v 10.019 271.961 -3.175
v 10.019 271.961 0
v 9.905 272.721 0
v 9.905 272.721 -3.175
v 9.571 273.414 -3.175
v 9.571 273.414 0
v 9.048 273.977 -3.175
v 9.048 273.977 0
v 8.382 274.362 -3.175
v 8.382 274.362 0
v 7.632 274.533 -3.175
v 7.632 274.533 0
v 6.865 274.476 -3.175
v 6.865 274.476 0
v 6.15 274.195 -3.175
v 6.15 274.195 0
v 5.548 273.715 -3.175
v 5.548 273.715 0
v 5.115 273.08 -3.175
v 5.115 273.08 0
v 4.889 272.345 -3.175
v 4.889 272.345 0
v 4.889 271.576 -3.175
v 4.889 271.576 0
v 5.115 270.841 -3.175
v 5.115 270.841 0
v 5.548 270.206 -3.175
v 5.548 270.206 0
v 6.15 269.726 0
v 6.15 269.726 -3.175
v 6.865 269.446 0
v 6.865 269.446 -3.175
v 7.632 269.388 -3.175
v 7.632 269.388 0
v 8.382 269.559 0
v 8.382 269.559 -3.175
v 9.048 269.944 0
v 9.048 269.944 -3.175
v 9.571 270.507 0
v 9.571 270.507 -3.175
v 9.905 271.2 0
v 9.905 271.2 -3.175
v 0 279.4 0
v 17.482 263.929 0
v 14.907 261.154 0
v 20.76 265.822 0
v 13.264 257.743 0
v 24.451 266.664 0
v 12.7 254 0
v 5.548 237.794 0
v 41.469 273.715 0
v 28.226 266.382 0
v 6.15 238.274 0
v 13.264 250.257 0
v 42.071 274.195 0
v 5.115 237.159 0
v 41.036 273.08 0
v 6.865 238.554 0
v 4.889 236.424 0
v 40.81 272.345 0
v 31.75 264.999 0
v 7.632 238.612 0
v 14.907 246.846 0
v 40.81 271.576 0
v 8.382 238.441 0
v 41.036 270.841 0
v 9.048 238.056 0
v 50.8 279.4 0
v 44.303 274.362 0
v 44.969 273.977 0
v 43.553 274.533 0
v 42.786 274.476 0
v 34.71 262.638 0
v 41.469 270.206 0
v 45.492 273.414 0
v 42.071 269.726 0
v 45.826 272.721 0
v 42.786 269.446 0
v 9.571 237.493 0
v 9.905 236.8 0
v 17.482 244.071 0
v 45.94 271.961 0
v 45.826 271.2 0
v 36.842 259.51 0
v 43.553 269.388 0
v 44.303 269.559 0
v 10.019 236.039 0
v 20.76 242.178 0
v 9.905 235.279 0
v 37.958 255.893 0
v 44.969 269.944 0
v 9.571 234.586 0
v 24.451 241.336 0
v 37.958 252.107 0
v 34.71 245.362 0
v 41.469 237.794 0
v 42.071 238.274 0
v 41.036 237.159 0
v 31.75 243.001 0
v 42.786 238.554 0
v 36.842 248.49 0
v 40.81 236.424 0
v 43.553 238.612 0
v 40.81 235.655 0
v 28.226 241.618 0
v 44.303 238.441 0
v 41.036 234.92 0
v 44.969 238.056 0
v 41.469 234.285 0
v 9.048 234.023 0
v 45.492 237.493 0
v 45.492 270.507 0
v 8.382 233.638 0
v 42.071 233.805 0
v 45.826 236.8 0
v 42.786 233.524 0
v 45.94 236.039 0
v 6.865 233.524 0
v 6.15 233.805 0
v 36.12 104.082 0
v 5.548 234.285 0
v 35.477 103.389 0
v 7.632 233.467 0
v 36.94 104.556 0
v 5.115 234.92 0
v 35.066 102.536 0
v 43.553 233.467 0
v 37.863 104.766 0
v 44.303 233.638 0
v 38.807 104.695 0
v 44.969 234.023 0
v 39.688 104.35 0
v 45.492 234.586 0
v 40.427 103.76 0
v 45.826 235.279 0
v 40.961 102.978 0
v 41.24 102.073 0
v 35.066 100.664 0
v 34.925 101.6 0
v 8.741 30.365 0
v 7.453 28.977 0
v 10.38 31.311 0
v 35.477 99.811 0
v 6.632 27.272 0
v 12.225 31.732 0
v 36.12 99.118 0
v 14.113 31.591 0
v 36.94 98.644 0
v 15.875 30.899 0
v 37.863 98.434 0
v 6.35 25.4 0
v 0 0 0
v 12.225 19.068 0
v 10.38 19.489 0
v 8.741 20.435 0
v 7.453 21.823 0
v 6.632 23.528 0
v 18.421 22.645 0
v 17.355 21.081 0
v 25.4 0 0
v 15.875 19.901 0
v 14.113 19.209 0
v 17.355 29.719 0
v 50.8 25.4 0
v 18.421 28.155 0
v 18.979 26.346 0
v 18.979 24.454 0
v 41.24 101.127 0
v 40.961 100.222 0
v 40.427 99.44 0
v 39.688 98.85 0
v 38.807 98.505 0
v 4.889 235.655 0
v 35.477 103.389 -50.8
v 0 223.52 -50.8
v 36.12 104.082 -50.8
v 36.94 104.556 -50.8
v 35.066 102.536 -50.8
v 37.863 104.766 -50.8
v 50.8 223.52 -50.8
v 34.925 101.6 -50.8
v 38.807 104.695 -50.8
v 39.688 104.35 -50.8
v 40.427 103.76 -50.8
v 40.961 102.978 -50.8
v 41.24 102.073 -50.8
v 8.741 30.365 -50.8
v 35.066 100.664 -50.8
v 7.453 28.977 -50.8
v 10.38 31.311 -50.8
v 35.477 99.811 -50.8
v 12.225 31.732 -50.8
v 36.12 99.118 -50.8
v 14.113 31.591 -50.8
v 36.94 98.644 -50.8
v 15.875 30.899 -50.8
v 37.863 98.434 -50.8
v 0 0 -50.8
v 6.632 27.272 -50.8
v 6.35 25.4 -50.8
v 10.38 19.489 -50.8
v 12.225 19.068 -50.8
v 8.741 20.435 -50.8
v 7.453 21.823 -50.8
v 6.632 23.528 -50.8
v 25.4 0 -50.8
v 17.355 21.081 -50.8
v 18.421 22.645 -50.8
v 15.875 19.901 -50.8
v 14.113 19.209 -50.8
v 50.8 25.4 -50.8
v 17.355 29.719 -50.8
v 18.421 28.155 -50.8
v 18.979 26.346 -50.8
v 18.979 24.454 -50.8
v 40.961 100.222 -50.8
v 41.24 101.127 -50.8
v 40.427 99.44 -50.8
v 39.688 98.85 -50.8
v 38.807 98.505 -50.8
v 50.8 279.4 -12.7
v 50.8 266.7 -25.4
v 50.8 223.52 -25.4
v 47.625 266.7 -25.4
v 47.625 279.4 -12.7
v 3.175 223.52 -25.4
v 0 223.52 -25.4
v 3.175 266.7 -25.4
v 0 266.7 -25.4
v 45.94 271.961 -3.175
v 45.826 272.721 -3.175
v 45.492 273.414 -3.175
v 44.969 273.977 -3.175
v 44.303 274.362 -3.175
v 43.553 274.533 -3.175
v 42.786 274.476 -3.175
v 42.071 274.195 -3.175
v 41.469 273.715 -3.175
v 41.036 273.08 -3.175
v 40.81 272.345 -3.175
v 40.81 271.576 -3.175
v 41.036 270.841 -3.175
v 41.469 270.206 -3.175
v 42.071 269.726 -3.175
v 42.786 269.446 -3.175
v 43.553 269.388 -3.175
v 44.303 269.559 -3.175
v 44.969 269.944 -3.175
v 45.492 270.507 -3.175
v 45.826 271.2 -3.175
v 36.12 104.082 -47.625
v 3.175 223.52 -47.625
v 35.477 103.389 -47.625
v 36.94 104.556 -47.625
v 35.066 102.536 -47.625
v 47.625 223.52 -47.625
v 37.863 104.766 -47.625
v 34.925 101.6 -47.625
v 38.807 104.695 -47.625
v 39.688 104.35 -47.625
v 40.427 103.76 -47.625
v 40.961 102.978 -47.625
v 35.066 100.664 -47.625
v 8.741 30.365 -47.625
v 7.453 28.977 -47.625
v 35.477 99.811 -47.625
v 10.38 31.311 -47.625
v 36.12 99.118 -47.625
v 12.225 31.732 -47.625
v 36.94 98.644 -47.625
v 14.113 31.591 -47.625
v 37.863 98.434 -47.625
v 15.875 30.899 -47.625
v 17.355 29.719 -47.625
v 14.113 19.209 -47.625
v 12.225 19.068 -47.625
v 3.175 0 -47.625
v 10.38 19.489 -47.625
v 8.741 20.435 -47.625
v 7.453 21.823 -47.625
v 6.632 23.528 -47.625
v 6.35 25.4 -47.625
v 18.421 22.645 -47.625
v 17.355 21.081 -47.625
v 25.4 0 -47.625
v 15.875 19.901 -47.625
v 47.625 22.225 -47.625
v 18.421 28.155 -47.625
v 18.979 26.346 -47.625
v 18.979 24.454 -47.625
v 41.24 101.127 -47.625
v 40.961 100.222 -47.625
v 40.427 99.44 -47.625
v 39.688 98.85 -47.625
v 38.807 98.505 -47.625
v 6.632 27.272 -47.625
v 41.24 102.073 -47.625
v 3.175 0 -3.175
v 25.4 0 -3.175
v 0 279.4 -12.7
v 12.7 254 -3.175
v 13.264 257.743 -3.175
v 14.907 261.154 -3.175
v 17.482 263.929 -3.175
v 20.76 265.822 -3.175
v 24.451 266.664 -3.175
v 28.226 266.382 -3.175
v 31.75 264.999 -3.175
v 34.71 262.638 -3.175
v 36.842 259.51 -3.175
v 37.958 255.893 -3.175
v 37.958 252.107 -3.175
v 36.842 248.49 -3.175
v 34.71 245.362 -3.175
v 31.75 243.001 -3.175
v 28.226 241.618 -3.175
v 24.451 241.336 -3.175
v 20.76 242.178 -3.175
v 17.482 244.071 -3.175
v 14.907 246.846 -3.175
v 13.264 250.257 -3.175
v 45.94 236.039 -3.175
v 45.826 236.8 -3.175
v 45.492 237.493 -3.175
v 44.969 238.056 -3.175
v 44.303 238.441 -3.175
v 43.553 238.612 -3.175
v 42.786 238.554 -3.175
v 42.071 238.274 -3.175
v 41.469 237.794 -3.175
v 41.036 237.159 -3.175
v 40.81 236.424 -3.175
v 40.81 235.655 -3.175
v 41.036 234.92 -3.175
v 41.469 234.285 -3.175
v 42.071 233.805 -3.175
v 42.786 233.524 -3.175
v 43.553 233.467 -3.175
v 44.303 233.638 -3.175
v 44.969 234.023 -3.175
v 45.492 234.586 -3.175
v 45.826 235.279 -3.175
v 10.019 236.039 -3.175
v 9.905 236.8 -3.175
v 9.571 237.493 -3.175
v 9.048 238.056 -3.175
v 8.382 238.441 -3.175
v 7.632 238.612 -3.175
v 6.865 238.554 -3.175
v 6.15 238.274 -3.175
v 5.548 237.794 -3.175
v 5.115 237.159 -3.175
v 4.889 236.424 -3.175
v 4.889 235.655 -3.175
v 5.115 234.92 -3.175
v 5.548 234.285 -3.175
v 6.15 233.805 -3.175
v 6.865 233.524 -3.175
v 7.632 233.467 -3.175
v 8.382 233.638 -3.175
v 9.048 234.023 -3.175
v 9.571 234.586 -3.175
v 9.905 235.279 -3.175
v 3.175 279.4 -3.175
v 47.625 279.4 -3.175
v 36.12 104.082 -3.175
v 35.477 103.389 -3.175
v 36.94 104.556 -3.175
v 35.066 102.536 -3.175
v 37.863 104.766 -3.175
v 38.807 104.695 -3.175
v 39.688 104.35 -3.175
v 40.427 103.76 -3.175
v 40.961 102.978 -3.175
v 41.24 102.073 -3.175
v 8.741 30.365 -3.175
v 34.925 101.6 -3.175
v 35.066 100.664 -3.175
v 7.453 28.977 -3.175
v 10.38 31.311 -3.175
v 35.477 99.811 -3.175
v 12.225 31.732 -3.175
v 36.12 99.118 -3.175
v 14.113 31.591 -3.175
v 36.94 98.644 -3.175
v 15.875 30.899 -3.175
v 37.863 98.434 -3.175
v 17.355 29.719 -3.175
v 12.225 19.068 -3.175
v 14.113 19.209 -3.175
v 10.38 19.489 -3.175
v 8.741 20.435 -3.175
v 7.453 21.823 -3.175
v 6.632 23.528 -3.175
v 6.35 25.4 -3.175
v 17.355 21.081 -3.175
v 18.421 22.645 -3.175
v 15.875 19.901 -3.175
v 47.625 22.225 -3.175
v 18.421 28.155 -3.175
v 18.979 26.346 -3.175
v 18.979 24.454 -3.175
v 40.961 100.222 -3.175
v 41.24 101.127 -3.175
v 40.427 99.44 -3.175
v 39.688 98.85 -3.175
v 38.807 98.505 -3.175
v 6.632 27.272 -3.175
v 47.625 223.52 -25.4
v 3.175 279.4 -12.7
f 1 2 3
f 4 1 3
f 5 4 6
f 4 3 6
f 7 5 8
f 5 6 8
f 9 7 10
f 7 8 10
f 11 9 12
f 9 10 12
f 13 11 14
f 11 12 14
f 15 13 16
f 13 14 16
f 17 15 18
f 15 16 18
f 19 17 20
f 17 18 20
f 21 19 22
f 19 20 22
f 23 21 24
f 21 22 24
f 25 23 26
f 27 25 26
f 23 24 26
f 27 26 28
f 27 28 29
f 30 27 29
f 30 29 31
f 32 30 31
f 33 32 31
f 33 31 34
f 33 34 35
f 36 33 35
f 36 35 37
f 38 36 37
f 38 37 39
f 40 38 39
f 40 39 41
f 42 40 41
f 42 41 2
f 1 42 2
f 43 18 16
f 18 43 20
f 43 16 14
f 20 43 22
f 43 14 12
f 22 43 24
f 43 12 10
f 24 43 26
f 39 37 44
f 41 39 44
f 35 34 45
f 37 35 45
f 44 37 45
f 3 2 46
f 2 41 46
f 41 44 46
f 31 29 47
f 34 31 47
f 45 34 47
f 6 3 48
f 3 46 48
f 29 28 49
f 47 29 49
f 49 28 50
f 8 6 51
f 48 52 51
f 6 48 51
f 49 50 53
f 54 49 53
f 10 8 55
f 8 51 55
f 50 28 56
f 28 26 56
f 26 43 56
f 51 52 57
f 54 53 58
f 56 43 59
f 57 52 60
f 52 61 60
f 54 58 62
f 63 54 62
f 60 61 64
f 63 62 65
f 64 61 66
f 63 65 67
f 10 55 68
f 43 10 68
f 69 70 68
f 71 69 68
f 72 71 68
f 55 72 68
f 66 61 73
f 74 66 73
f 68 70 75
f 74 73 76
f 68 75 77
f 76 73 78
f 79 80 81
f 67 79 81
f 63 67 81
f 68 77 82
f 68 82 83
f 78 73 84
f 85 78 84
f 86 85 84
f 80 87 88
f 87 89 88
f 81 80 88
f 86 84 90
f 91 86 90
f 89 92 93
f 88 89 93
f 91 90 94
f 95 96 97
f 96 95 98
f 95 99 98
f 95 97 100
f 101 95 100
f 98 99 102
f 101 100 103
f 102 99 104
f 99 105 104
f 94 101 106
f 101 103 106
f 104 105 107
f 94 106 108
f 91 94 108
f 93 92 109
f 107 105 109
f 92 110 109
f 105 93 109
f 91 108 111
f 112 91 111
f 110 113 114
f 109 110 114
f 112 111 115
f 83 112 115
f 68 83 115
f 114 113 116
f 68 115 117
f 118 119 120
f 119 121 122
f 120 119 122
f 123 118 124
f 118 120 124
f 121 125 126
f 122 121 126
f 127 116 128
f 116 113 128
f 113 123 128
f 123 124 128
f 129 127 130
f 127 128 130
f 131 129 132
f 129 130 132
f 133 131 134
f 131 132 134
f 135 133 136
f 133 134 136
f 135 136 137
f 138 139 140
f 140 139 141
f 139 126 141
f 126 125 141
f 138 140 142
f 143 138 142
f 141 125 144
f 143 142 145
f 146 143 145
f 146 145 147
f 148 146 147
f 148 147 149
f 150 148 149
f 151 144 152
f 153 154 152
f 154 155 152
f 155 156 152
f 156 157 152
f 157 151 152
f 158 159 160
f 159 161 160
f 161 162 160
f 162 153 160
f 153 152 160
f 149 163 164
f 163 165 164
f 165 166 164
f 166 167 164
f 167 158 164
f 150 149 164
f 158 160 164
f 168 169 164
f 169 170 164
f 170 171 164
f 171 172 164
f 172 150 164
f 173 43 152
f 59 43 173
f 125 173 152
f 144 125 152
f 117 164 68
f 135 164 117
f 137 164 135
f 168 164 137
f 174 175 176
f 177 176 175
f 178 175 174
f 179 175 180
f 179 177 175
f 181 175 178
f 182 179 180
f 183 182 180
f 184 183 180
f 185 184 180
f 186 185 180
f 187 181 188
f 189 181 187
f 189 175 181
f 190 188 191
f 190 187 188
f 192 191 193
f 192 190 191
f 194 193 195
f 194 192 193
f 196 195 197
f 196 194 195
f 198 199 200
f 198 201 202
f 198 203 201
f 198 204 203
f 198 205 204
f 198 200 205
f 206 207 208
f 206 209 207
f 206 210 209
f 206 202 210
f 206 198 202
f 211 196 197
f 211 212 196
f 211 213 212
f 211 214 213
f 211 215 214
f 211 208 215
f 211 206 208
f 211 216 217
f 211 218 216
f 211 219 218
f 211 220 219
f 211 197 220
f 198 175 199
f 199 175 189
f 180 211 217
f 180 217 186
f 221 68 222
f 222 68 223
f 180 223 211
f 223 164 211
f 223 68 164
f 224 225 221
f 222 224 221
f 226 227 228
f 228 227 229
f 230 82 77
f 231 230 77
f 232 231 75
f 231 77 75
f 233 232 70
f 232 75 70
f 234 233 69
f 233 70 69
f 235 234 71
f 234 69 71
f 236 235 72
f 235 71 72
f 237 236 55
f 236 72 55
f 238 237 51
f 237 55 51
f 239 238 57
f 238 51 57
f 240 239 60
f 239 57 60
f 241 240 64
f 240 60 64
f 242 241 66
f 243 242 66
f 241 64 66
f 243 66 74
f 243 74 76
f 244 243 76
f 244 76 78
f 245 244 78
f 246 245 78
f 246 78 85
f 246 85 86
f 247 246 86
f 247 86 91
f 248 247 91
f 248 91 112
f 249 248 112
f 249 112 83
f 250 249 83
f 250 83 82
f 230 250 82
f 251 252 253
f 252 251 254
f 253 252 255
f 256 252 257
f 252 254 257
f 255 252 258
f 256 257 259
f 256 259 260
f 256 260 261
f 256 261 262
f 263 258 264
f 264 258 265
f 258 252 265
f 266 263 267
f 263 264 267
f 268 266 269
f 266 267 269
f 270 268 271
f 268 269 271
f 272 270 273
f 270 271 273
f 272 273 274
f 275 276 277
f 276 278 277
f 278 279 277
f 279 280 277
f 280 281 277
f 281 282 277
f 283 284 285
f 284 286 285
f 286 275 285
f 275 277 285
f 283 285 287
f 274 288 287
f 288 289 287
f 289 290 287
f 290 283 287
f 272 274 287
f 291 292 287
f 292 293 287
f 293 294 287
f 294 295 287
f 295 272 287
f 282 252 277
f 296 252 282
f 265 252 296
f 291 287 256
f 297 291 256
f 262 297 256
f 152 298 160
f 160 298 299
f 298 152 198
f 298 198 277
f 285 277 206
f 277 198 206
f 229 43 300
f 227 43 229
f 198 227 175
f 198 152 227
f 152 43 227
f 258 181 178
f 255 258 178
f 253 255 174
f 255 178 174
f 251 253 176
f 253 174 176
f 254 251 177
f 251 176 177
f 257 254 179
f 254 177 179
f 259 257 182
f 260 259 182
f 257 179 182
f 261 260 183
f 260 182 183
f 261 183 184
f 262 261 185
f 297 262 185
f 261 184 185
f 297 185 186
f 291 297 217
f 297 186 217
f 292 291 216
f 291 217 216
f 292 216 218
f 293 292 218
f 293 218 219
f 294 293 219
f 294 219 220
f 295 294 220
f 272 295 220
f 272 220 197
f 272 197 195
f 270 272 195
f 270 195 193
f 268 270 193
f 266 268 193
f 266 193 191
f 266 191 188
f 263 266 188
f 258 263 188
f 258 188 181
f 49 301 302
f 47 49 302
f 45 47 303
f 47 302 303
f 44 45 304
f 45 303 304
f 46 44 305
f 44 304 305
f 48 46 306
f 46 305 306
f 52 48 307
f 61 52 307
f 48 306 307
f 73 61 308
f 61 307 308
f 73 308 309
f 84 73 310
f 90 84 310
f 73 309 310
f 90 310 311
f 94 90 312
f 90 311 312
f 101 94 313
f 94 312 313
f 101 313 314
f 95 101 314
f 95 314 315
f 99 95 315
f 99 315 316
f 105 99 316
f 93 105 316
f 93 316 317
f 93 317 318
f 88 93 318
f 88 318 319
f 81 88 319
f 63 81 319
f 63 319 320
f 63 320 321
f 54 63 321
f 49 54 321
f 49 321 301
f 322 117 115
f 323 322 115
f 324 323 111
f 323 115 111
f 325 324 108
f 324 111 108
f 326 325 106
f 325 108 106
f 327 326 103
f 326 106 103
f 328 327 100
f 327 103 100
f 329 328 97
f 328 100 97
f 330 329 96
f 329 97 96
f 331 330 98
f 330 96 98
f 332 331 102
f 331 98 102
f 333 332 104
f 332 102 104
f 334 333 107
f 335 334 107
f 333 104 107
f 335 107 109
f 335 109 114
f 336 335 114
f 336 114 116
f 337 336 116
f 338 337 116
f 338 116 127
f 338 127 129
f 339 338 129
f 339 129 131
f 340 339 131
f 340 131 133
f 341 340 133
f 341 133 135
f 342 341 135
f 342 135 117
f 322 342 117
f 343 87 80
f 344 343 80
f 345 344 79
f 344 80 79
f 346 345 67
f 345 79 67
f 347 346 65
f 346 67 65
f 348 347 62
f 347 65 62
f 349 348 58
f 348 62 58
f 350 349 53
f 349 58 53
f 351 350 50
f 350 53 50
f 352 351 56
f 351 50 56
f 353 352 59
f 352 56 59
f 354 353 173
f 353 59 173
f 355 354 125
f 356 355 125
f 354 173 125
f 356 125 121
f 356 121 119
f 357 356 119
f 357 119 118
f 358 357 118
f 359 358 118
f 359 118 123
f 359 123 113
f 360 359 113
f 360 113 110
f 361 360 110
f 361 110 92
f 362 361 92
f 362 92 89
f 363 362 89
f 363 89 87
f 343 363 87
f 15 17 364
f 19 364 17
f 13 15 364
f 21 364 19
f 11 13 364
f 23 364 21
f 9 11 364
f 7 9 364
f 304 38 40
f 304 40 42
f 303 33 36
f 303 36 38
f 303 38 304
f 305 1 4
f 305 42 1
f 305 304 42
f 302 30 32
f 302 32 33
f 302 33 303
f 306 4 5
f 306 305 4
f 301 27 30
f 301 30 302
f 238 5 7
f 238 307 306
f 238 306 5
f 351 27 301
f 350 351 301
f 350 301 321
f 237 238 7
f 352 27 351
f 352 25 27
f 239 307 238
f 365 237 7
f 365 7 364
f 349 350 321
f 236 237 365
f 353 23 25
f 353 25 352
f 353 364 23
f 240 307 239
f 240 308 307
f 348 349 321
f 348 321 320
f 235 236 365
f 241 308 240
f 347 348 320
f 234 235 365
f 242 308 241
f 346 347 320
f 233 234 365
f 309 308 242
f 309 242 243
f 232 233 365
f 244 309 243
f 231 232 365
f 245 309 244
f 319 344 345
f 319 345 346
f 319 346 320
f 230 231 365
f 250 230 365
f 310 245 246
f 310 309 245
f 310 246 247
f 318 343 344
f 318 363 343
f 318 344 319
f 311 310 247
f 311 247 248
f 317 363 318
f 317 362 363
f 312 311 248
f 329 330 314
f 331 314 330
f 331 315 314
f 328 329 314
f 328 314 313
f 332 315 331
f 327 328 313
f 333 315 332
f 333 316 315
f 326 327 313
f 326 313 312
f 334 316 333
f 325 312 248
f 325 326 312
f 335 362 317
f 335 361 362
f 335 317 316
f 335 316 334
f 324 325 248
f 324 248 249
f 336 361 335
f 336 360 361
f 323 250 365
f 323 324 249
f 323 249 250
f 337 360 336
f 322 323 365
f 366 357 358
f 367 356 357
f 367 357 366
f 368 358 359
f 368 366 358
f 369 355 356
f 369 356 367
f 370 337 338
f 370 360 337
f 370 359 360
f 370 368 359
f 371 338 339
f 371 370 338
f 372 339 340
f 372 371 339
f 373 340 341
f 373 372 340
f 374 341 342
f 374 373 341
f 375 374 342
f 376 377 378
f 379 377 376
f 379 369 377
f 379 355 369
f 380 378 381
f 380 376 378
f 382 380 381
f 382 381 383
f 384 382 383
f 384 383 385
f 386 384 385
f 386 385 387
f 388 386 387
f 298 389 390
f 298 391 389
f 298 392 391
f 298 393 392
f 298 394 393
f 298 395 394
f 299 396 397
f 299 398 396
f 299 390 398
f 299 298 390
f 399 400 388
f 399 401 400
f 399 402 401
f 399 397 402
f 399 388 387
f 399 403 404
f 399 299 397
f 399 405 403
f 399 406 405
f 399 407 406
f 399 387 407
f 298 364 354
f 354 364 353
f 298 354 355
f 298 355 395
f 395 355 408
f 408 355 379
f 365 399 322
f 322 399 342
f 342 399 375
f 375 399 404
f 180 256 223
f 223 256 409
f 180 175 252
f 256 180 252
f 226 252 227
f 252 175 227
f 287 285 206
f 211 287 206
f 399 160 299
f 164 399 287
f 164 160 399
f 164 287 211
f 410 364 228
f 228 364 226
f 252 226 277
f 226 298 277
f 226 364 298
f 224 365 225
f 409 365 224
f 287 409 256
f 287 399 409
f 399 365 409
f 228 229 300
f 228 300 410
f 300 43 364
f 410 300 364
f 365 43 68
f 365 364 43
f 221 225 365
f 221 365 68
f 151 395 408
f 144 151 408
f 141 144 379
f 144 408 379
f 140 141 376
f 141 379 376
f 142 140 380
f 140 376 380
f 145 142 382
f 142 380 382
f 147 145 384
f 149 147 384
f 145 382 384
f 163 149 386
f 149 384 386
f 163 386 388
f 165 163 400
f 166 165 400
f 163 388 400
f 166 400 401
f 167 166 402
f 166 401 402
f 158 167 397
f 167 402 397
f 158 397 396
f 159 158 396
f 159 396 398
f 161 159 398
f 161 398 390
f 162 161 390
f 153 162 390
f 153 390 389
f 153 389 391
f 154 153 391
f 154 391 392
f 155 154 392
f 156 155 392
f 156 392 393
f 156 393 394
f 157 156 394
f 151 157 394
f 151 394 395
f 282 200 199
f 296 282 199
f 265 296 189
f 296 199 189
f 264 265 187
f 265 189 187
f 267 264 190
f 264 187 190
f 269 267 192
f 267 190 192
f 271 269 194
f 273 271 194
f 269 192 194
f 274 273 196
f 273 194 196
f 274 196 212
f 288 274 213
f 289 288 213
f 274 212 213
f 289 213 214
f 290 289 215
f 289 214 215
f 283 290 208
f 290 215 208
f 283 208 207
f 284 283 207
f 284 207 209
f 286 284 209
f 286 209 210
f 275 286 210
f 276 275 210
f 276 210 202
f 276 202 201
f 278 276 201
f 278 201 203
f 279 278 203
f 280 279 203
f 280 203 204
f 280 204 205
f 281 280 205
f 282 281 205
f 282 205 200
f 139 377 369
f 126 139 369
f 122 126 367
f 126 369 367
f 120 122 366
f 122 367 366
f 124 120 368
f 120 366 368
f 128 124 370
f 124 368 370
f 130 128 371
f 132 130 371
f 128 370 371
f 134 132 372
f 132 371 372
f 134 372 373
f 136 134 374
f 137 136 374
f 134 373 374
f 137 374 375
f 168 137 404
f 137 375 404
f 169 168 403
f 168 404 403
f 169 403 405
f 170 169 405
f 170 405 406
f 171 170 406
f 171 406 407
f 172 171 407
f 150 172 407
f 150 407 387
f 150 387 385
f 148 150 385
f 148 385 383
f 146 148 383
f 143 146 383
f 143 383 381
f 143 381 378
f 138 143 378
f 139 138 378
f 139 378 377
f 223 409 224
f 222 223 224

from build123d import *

# Parameters (mm, degrees)
SKETCH1_W           = 50.8
SKETCH1_H           = 50.8
SKETCH1_W_2         = 44.45
SKETCH1_H_2         = 44.45
BOSS_EXTRUDE1_DEPTH = 279.4
SKETCH2_R           = 6.35
SKETCH2_R_2         = 12.7
CUT_EXTRUDE1_DEPTH  = 289.488543967
CHAMFER1_SIZE       = 25.4
SKETCH3_R           = 3.175
CUT_EXTRUDE2_DEPTH  = 289.488543967
SKETCH4_W           = 25.4
SKETCH4_H           = 55.88
CUT_EXTRUDE3_DEPTH  = 289.488543967
CHAMFER2_SIZE       = 12.7
CUT_EXTRUDE5_REACH  = 290.489
SKETCH6_R           = 2.5796875


with BuildPart() as part:
    # Sketch1 → Boss-Extrude1 (new body)
    with BuildSketch(Plane(origin=(0, 0, 0), x_dir=(1, 0, 0), z_dir=(0, 1, 0))):
        with Locations((25.4, 25.4)):
            Rectangle(SKETCH1_W, SKETCH1_H)
        with Locations((25.4, 25.4)):
            Rectangle(SKETCH1_W_2, SKETCH1_H_2, mode=Mode.SUBTRACT)
    extrude(amount=BOSS_EXTRUDE1_DEPTH)

    # Sketch2 → Cut-Extrude1 (cut, through all)
    with BuildSketch(Plane(origin=(0, 0, -50.8), x_dir=(-1, 0, 0), z_dir=(0, 0, -1))):
        with Locations((-12.7, 25.4)):
            Circle(SKETCH2_R)
        with Locations((-25.4, 254)):
            Circle(SKETCH2_R_2)
    extrude(amount=-CUT_EXTRUDE1_DEPTH, mode=Mode.SUBTRACT)

    # Chamfer1
    # the kernel refuses this chamfer: 25.4 mm, written as the material it takes off along each edge
    with BuildSketch(Plane(origin=(50.8, 0, 65.320747894), x_dir=(-0.9996219169112966, -0.02749587661058637, 0), z_dir=(0, 0, -1))) as chamfer1_piece_1:
        Polygon((CHAMFER1_SIZE * 0.999621916911, CHAMFER1_SIZE * 0.0274958766106), (-CHAMFER1_SIZE * 0.0274958766106, CHAMFER1_SIZE * 0.999621916911), (0, 0), align=None)
    extrude(amount=181.441495789, mode=Mode.SUBTRACT)

    # Sketch3 → Cut-Extrude2 (cut, through all)
    with BuildSketch(Plane(origin=(0, 0, -50.8), x_dir=(-1, 0, 0), z_dir=(0, 0, -1))):
        with Locations((-38.1, 101.6)):
            Circle(SKETCH3_R)
    extrude(amount=-CUT_EXTRUDE2_DEPTH, mode=Mode.SUBTRACT)

    # Sketch4 → Cut-Extrude3 (cut, through all)
    with BuildSketch(Plane.ZY):
        with Locations((-38.1, 251.46)):
            Rectangle(SKETCH4_W, SKETCH4_H)
    extrude(amount=-CUT_EXTRUDE3_DEPTH, mode=Mode.SUBTRACT)

    # Chamfer2
    chamfer2_edges = [part.edges().sort_by_distance(p)[0] for p in [
        (49.2125, 279.4, -25.4),
        (1.5875, 279.4, -25.4),
    ]]
    chamfer(chamfer2_edges, length=CHAMFER2_SIZE)

    # Sketch6 → Cut-Extrude5 (cut, up to next)
    with BuildSketch(Plane.XY, mode=Mode.PRIVATE) as cut_extrude5_sk1:
        with Locations((7.439487758, 271.960512242)):
            Circle(SKETCH6_R)
    cut_extrude5_tool1 = extrude(cut_extrude5_sk1.sketch, amount=-CUT_EXTRUDE5_REACH, mode=Mode.PRIVATE) & part.part
    # Sketch6 → Cut-Extrude5 (cut, up to next)
    with BuildSketch(Plane.XY, mode=Mode.PRIVATE) as cut_extrude5_sk2:
        with Locations((7.439487758, 236.039487758)):
            Circle(SKETCH6_R)
    cut_extrude5_tool2 = extrude(cut_extrude5_sk2.sketch, amount=-CUT_EXTRUDE5_REACH, mode=Mode.PRIVATE) & part.part
    # Sketch6 → Cut-Extrude5 (cut, up to next)
    with BuildSketch(Plane.XY, mode=Mode.PRIVATE) as cut_extrude5_sk3:
        with Locations((43.360512242, 236.039487758)):
            Circle(SKETCH6_R)
    cut_extrude5_tool3 = extrude(cut_extrude5_sk3.sketch, amount=-CUT_EXTRUDE5_REACH, mode=Mode.PRIVATE) & part.part
    # Sketch6 → Cut-Extrude5 (cut, up to next)
    with BuildSketch(Plane.XY, mode=Mode.PRIVATE) as cut_extrude5_sk4:
        with Locations((43.360512242, 271.960512242)):
            Circle(SKETCH6_R)
    cut_extrude5_tool4 = extrude(cut_extrude5_sk4.sketch, amount=-CUT_EXTRUDE5_REACH, mode=Mode.PRIVATE) & part.part
    add(cut_extrude5_tool1.solids().sort_by_distance((7.439488, 271.960512, 0))[0], mode=Mode.SUBTRACT)
    add(cut_extrude5_tool2.solids().sort_by_distance((7.439488, 236.039488, 0))[0], mode=Mode.SUBTRACT)
    add(cut_extrude5_tool3.solids().sort_by_distance((43.360512, 236.039488, 0))[0], mode=Mode.SUBTRACT)
    add(cut_extrude5_tool4.solids().sort_by_distance((43.360512, 271.960512, 0))[0], mode=Mode.SUBTRACT)


solid = part.part
